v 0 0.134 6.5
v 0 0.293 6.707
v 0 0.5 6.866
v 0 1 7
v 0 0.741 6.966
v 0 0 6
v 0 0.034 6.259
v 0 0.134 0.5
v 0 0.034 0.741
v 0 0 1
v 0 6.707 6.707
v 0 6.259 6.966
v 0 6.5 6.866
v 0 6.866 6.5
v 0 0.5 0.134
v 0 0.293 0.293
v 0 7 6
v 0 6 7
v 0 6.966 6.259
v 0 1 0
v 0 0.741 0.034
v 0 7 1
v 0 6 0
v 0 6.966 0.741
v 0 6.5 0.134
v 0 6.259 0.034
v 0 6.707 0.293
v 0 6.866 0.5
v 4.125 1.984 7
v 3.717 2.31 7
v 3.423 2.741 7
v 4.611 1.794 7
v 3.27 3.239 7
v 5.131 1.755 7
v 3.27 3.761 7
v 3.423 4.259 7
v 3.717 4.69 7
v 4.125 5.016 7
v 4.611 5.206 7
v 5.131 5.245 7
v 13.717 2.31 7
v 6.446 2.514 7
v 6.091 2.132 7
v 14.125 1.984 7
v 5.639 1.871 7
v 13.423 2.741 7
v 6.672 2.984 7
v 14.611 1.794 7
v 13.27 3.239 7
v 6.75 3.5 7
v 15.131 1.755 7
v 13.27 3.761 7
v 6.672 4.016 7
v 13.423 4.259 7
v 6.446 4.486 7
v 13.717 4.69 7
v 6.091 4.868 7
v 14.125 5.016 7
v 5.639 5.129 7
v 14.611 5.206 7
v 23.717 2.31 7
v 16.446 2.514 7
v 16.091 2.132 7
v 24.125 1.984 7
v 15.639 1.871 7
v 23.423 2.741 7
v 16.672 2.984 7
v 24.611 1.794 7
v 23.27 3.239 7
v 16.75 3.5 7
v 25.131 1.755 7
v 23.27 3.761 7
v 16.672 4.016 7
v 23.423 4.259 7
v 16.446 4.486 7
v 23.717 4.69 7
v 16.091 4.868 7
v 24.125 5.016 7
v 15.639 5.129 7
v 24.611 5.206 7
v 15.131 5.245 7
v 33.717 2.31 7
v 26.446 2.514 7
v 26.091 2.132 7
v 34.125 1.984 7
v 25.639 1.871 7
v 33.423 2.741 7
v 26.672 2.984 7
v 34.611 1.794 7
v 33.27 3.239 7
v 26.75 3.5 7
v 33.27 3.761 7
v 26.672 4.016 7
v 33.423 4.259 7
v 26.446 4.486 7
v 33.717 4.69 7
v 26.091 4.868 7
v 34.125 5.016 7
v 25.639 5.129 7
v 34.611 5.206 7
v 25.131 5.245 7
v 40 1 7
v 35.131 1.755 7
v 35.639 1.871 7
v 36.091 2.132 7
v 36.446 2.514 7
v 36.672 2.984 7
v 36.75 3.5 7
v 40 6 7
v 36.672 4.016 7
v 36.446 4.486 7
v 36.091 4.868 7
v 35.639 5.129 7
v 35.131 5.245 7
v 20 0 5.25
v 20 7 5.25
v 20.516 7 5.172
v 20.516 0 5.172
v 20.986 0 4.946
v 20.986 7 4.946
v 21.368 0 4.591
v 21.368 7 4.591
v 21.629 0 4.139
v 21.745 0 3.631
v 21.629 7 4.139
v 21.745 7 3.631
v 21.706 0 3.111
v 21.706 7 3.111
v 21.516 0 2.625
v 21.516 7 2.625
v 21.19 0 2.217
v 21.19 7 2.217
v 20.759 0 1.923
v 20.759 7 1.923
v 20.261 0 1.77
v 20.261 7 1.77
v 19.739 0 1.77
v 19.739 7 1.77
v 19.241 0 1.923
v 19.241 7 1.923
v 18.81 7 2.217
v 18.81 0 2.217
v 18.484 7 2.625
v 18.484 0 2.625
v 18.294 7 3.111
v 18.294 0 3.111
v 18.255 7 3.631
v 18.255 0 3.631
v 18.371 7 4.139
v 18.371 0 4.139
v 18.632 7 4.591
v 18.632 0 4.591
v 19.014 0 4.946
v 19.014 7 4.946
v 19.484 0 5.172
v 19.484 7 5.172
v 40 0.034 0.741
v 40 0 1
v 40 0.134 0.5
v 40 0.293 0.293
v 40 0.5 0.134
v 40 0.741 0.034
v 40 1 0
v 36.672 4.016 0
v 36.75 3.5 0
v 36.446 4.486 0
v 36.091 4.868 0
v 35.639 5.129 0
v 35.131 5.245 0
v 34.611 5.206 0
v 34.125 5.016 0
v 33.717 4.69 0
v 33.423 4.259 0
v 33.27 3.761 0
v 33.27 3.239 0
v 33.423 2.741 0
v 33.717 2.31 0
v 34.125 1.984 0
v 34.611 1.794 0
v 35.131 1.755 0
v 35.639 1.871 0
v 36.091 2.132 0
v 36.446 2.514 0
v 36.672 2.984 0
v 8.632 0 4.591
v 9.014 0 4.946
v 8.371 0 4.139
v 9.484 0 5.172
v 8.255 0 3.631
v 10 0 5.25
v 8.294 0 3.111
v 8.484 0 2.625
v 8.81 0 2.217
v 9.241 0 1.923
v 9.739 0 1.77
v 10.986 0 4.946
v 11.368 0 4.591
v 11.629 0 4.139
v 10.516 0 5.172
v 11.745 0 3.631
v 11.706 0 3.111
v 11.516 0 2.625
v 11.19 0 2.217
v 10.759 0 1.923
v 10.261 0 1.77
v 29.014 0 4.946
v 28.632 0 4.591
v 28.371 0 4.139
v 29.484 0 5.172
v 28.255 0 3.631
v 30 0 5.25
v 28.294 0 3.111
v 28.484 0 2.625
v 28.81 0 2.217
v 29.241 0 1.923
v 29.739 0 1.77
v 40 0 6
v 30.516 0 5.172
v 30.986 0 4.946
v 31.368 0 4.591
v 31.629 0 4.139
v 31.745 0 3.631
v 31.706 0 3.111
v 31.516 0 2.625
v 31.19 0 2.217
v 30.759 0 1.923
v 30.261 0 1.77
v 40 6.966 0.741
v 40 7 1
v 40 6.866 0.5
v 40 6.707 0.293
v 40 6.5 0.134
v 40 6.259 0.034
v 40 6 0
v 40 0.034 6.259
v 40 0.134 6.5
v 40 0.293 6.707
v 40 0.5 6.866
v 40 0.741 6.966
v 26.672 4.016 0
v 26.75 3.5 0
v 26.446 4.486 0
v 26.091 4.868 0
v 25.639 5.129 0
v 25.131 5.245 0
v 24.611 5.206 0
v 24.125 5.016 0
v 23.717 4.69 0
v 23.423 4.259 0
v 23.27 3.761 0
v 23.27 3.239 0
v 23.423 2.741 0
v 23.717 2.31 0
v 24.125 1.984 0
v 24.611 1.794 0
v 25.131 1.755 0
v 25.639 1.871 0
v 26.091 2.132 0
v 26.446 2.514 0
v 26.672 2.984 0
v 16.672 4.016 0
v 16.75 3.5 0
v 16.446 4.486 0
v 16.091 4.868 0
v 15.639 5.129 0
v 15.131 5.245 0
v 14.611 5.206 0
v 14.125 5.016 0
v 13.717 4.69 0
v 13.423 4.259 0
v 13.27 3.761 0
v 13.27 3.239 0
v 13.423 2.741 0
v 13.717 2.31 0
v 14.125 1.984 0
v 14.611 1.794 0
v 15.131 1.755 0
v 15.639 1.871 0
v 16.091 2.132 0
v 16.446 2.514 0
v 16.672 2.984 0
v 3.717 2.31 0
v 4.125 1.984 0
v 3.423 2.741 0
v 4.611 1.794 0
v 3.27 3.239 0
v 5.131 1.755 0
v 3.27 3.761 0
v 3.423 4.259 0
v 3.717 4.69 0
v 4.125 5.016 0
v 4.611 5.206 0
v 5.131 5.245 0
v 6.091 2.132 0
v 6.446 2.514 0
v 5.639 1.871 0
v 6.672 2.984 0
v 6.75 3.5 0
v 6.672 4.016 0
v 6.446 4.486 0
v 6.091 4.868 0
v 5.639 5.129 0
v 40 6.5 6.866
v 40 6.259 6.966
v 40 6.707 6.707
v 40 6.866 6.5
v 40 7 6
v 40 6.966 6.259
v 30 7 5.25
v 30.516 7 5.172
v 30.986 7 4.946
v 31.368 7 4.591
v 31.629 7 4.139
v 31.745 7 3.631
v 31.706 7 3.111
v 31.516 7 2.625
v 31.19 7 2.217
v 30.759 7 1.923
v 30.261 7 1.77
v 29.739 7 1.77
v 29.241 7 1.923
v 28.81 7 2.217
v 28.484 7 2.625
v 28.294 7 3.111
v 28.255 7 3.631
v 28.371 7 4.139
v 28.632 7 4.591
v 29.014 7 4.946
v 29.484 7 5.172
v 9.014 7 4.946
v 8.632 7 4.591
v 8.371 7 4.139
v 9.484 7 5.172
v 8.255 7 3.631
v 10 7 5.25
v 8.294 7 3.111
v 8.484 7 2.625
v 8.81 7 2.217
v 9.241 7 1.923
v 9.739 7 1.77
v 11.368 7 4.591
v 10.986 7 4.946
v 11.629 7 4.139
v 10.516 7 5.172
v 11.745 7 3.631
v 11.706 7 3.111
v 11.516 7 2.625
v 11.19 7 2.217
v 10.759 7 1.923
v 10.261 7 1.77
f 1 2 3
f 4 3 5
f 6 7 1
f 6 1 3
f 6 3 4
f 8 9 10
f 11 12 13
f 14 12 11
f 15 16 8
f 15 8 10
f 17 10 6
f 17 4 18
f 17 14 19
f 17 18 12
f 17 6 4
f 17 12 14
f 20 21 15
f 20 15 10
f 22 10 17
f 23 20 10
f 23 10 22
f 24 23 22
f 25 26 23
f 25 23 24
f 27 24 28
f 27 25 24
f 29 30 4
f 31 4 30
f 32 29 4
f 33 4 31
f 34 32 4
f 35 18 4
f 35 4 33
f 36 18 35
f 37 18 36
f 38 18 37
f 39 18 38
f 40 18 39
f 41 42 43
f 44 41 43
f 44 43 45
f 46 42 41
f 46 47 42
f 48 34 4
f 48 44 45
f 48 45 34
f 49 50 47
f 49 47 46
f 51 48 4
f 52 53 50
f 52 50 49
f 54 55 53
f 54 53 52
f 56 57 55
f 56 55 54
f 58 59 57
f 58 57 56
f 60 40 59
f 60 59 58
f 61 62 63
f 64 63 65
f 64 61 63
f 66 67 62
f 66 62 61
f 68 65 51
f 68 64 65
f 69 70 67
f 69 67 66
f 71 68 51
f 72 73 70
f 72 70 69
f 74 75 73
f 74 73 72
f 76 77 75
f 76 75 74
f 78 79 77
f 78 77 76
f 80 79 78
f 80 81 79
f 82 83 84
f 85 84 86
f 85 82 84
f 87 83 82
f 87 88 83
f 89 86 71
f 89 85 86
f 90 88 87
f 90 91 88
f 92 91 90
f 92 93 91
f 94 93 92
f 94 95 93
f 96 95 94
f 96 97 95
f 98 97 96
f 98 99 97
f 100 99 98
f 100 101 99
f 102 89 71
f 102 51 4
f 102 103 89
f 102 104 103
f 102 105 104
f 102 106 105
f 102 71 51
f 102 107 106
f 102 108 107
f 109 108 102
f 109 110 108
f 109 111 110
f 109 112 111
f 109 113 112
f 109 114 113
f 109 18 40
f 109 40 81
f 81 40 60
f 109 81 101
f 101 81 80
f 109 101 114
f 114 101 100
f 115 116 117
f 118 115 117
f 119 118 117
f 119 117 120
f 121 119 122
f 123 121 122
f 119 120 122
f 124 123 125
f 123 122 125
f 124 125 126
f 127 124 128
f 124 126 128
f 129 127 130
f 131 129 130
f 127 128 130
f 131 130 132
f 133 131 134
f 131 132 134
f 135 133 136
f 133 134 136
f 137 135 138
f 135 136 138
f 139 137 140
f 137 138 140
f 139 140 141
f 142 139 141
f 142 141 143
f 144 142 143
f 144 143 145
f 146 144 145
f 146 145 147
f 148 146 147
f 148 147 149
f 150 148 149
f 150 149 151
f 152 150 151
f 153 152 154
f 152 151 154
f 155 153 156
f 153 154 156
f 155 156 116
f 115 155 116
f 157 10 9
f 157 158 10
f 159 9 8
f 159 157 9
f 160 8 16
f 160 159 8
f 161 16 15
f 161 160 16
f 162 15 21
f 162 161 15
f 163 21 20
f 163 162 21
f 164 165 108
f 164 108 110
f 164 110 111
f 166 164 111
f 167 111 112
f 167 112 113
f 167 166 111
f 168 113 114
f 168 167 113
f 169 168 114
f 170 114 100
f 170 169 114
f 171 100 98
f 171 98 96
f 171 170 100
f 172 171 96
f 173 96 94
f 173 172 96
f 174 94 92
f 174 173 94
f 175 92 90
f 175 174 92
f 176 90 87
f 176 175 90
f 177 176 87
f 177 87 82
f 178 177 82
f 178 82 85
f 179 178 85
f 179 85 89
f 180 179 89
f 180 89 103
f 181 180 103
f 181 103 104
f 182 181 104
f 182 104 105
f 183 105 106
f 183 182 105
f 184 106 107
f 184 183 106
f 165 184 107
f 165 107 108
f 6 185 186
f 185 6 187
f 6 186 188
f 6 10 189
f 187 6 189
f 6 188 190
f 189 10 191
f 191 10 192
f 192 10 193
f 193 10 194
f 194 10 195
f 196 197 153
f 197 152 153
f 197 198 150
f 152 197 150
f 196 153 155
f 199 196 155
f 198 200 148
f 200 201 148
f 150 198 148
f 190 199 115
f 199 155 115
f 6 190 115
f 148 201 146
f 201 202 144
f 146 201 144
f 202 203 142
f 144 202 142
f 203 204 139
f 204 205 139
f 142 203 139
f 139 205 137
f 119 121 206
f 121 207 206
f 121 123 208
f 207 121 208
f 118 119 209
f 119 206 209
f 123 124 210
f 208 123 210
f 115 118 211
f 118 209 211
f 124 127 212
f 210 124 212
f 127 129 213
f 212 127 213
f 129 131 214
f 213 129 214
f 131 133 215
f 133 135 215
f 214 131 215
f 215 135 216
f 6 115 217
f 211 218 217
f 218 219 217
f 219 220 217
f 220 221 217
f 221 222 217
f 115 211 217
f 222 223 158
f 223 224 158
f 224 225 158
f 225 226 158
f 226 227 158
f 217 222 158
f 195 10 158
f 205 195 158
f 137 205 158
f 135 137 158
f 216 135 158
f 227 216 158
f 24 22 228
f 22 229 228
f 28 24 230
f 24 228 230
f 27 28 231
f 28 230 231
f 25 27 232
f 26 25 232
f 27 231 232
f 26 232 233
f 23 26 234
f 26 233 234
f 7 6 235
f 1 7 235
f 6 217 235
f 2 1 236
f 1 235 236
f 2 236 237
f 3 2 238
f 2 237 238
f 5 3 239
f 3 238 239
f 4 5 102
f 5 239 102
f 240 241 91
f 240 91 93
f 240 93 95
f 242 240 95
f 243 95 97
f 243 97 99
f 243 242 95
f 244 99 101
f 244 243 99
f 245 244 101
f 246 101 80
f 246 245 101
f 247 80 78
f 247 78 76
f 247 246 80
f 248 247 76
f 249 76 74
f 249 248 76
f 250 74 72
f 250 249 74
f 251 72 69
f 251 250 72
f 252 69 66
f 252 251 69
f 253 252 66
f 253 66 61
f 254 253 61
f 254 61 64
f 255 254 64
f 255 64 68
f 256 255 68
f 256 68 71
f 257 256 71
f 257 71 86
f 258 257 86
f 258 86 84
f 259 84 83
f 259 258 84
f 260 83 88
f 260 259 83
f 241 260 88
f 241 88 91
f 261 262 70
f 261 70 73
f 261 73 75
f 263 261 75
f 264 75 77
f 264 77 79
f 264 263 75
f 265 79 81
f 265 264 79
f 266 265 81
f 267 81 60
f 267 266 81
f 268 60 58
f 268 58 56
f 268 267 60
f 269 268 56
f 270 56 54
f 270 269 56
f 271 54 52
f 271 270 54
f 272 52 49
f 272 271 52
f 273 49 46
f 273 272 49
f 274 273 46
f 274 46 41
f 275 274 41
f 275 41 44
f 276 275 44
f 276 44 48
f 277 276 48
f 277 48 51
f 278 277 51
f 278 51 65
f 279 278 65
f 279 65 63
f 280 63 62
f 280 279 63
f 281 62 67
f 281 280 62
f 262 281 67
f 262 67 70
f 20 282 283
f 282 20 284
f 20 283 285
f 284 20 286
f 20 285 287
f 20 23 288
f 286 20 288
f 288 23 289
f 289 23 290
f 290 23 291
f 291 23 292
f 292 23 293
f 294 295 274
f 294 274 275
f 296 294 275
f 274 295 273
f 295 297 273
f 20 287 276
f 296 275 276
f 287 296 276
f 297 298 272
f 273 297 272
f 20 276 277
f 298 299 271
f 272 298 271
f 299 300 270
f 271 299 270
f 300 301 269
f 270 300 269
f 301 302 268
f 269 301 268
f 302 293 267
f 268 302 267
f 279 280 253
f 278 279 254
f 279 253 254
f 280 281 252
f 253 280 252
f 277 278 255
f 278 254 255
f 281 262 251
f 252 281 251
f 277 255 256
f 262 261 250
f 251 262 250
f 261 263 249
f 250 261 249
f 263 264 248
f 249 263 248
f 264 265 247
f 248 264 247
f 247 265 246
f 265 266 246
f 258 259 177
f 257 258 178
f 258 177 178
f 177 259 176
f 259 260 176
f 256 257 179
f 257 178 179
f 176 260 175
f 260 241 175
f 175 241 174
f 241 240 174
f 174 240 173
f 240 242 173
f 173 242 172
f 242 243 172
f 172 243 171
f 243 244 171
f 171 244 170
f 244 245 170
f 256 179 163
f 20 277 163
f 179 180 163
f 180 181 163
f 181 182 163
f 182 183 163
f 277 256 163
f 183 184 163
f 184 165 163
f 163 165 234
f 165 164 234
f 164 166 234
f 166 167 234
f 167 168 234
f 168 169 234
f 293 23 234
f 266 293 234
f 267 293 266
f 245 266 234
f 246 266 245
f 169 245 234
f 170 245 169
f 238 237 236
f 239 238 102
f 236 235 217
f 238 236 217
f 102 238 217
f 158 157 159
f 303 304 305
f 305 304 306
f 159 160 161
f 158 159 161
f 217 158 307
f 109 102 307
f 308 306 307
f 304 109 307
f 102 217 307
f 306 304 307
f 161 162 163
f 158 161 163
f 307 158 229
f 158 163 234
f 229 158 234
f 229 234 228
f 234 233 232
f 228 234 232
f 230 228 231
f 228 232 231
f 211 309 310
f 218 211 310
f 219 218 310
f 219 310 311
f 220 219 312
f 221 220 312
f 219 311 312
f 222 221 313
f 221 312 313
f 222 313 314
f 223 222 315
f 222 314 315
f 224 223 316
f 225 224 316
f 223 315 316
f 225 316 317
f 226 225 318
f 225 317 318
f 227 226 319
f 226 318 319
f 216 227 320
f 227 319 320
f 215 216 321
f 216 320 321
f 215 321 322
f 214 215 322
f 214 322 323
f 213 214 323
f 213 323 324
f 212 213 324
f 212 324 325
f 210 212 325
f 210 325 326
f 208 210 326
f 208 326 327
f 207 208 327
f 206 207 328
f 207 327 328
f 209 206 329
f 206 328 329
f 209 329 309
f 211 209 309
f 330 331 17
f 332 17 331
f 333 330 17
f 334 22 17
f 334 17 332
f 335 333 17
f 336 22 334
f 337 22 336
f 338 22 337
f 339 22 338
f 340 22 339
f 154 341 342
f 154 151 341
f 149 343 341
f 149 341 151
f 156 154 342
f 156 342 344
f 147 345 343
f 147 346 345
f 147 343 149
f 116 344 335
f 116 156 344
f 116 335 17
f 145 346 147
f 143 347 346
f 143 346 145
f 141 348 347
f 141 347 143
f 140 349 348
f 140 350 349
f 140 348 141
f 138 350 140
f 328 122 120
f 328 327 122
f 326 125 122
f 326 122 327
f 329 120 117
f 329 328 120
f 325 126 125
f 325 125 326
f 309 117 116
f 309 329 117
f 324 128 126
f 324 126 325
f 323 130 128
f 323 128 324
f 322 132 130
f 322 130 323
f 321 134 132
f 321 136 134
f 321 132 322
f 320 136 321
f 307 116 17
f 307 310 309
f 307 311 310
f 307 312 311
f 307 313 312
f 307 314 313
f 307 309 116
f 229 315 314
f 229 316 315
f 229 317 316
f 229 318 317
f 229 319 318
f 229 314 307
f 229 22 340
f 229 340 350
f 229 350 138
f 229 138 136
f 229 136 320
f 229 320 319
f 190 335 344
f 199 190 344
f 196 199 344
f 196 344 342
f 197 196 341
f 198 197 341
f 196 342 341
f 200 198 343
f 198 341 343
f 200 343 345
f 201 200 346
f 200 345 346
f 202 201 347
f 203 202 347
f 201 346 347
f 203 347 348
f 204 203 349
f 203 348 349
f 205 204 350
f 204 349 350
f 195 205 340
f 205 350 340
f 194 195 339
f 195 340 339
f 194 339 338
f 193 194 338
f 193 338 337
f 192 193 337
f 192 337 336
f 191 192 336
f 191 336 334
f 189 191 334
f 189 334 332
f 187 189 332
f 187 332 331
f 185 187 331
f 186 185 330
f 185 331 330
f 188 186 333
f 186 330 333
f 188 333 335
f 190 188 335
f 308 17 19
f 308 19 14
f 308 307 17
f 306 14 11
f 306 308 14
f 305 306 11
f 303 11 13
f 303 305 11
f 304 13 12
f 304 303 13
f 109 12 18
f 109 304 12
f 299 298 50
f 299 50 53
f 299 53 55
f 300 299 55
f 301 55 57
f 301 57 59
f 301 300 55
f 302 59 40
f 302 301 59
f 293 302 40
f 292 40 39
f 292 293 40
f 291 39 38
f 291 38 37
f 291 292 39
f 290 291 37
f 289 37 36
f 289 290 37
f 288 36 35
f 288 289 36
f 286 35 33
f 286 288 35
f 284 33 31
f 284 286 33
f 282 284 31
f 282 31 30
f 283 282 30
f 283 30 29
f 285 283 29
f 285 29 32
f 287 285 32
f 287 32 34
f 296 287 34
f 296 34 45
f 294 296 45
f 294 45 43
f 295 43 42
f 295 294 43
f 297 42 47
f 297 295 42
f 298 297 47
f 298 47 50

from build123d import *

# Parameters (mm, degrees)
SKETCH_1_W          = 40
SKETCH_1_H          = 7
SKETCH_1_R          = 1.75
EXTRUDE_1_DEPTH     = 7
SKETCH_2_R          = 1.75
CUT_EXTRUDE_1_DEPTH = 7
FILLET_1_R          = 1


with BuildPart() as part:
    # 草图1 → 凸台-拉伸1 (new body)
    with BuildSketch(Plane.XY):
        with Locations((20, 3.5)):
            Rectangle(SKETCH_1_W, SKETCH_1_H)
        with Locations((5, 3.5)):
            Circle(SKETCH_1_R, mode=Mode.SUBTRACT)
        with Locations((15, 3.5)):
            Circle(SKETCH_1_R, mode=Mode.SUBTRACT)
        with Locations((25, 3.5)):
            Circle(SKETCH_1_R, mode=Mode.SUBTRACT)
        with Locations((35, 3.5)):
            Circle(SKETCH_1_R, mode=Mode.SUBTRACT)
    extrude(amount=EXTRUDE_1_DEPTH)

    # 草图2 → 切除-拉伸1 (cut)
    with BuildSketch(Plane(origin=(0, 7, 0), x_dir=(1, 0, 0), z_dir=(0, 1, 0))):
        with Locations(Location((20, -3.5, 0), (0, 0, 270))):
            Circle(SKETCH_2_R)
        with Locations(Location((30, -3.5, 0), (0, 0, 270))):
            Circle(SKETCH_2_R)
        with Locations(Location((10, -3.5, 0), (0, 0, 270))):
            Circle(SKETCH_2_R)
    extrude(amount=-CUT_EXTRUDE_1_DEPTH, mode=Mode.SUBTRACT)

    # 圆角1
    fillet_1_edges = [part.edges().sort_by_distance(p)[0] for p in [
        (20, 7, 7),
        (20, 7, 0),
        (20, 0, 0),
        (20, 0, 7),
    ]]
    fillet(fillet_1_edges, radius=FILLET_1_R)


solid = part.part
